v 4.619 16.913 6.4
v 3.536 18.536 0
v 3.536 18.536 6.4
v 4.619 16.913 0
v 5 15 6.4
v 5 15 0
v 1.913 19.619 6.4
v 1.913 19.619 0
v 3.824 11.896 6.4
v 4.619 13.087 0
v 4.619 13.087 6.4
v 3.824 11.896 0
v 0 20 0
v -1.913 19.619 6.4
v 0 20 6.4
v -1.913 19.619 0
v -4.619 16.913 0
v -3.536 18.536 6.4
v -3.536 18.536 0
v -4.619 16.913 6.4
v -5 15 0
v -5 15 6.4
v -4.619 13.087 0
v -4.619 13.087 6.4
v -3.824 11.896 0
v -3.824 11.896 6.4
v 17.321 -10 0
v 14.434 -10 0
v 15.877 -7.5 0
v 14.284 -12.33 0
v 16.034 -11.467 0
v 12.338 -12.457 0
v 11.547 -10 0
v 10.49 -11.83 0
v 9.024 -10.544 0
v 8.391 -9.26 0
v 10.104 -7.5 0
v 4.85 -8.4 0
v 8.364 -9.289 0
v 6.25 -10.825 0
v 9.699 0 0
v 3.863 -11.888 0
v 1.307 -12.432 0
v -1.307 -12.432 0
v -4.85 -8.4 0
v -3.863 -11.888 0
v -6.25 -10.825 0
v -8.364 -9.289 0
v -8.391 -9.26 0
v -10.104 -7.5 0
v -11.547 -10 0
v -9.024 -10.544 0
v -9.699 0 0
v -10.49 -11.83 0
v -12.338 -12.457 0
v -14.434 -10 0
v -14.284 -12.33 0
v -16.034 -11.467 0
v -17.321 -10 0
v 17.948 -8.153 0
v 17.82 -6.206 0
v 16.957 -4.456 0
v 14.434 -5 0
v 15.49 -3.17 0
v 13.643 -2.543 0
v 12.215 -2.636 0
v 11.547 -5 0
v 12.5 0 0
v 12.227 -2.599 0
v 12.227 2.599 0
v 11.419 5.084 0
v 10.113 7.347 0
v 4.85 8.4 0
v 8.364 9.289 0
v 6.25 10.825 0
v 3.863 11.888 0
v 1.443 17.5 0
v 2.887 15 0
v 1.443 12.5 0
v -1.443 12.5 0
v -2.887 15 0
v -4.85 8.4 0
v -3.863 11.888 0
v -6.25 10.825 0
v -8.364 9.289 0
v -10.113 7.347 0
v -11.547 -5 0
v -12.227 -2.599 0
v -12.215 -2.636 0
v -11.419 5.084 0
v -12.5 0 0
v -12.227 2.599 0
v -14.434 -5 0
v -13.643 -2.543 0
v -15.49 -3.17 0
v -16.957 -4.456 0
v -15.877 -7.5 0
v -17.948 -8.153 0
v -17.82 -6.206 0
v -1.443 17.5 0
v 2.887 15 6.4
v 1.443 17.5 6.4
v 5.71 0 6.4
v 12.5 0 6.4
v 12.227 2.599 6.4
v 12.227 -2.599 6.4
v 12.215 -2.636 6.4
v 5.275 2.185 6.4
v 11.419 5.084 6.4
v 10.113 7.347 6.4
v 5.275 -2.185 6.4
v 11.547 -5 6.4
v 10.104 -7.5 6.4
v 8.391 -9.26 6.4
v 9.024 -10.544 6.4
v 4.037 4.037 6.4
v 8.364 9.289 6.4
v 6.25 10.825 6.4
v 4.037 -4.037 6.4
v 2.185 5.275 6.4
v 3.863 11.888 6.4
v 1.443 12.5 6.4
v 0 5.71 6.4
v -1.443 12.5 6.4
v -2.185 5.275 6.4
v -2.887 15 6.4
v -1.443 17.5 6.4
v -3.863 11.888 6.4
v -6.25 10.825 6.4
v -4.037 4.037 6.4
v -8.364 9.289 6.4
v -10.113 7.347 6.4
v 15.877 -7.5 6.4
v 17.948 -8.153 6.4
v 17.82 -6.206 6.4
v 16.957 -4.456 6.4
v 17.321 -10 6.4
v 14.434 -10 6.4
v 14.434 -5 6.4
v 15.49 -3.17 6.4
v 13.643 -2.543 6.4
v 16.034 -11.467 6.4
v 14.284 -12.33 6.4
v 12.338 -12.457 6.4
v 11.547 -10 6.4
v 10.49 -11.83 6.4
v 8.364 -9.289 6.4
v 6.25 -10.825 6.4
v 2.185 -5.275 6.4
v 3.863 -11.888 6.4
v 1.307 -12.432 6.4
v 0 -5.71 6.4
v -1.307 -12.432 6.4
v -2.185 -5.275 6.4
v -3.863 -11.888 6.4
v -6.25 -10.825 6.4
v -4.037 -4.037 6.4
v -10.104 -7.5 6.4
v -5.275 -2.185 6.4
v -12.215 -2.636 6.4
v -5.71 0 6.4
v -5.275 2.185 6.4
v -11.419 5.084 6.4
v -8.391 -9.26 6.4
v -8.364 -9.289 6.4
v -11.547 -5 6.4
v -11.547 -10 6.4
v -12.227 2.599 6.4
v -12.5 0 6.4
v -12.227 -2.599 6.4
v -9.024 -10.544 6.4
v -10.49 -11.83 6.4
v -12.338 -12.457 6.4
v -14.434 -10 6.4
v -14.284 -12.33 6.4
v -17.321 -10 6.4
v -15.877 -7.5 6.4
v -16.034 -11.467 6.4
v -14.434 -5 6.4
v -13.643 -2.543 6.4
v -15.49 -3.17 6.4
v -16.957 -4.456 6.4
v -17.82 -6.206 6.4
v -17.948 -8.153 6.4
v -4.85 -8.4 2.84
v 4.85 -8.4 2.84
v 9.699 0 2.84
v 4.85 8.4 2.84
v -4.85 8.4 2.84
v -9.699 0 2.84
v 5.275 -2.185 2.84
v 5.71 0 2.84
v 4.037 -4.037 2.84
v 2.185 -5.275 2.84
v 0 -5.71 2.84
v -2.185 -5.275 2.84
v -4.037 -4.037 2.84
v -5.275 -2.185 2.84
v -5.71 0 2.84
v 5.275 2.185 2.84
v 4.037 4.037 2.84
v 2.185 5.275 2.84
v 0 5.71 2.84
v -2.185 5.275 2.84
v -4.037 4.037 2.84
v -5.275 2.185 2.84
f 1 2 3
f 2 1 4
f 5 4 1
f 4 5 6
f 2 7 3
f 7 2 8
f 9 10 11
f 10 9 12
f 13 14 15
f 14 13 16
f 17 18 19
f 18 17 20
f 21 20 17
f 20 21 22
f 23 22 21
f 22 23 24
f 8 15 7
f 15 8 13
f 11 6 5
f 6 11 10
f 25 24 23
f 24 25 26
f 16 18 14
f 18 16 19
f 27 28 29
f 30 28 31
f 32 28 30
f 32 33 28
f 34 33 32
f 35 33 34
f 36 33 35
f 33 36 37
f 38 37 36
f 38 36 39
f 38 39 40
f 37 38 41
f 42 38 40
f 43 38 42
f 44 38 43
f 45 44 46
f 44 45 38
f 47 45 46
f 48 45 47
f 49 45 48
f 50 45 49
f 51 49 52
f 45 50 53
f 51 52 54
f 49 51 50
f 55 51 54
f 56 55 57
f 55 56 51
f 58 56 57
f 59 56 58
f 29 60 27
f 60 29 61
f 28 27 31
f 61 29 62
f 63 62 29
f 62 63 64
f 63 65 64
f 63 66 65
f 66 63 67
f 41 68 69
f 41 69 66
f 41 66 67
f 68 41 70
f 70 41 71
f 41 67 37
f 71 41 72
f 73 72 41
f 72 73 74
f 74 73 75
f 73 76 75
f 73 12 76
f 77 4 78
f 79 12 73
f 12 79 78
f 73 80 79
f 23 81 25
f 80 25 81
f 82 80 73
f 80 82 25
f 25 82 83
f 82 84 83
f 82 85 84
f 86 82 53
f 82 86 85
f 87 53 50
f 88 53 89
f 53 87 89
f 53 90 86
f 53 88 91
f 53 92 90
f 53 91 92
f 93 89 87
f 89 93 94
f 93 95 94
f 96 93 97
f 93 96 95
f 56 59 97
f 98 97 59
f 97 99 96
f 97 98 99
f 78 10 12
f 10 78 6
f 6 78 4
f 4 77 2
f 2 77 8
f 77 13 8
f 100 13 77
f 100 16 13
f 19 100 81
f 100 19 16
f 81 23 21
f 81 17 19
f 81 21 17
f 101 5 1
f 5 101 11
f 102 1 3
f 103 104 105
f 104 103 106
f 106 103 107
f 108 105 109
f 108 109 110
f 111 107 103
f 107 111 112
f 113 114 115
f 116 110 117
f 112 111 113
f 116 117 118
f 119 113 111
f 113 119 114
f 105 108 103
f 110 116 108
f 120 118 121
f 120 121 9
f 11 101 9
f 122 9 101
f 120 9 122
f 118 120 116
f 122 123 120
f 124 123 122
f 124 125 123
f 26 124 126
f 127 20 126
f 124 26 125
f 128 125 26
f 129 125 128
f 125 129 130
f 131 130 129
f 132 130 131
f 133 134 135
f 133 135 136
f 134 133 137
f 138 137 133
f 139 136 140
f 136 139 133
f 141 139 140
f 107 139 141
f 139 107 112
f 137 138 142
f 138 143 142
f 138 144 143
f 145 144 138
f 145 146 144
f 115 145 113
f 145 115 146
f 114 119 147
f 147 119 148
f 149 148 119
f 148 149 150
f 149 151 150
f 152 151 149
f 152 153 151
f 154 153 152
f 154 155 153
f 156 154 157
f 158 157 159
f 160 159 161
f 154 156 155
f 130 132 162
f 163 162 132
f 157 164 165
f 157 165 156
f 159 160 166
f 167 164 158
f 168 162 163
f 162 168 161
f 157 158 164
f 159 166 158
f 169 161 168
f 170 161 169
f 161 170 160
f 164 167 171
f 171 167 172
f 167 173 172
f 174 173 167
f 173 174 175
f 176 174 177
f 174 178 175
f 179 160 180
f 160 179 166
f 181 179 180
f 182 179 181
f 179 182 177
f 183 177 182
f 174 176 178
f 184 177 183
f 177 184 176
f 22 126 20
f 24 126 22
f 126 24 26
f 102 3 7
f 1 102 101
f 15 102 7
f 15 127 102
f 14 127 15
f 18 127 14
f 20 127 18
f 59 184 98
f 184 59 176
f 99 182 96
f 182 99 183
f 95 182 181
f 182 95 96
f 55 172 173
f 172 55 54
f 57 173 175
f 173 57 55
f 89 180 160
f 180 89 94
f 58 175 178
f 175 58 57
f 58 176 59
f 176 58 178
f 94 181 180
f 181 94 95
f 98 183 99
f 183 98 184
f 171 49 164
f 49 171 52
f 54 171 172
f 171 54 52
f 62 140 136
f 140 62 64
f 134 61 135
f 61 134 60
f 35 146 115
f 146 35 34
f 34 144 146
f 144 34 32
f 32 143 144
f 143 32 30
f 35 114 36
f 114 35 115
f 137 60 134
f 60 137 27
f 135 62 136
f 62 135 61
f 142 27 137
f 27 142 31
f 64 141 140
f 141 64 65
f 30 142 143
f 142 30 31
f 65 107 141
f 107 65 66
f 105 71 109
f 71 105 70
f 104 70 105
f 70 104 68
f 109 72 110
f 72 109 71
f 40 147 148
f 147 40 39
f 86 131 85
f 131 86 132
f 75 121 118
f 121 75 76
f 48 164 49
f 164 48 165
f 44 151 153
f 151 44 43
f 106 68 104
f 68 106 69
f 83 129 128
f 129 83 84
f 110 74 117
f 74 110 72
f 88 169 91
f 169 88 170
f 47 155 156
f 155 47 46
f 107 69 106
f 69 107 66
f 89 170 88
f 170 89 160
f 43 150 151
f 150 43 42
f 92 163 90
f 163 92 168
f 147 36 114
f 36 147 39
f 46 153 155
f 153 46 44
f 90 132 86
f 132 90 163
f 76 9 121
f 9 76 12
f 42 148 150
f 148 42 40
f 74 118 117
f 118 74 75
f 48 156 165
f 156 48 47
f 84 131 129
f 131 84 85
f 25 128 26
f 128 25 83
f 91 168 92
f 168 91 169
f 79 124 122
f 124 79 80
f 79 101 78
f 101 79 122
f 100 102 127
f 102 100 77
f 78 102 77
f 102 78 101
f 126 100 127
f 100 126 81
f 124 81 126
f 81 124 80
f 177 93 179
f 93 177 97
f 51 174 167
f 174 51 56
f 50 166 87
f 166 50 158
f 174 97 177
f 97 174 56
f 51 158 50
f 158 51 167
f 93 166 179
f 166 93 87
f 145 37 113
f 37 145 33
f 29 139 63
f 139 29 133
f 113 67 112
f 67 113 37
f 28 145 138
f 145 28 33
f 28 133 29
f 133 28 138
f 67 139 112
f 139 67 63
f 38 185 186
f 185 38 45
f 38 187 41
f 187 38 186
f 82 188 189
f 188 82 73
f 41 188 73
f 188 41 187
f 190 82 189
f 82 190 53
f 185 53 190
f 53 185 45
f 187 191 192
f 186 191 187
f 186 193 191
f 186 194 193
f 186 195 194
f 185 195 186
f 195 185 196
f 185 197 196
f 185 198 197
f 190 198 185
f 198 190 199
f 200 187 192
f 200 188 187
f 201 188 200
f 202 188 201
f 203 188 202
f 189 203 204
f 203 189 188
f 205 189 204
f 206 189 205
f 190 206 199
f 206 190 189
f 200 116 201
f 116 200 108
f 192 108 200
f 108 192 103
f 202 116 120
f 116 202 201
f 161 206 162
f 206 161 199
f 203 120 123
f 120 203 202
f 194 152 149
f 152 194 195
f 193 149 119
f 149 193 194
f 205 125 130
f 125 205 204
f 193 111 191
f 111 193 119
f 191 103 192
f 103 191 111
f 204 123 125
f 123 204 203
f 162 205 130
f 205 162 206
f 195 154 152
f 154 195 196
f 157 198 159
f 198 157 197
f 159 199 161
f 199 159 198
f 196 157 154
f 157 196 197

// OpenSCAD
// file: vars.scad
// Variables used throughout design.
// Yes, these could use some commenting.
// (c) 2014, Christopher "ScribbleJ" Jansen

// Printer outside dimensions are actually this + corner_thick*2.
printer_w = 400;
printer_l = 400;
printer_h = 400;

// Used wherever I need something arbitrarily large.
huge=500;

// 608 Bearings
//Added some extra space to the bearing retainer so I don't break them during assembly
bearing_w = 7*1.01;  
bearing_d = 22*1.01;
bearing_r = bearing_d/2;
bearing_hole_d = 8;
bearing_hole_r = bearing_hole_d/2;

// Miscellaneous bolts, M3
misc_bolt_d = 3.2;
misc_bolt_r = misc_bolt_d/2;
misc_nut_r  = misc_bolt_d;
misc_bolt_pitch = 0.5;
misc_bolthead_d = misc_bolt_d*2;
misc_bolthead_r = misc_bolthead_d/2;

//Retainer for using a regular bolt (M8) instead of a proper leadscrew as the Z lift nut.
liftNut_d = 8;
liftNut_od = liftNut_d *2;
liftNut_h = liftNut_d * 0.8;
liftNutRetainer_h = liftNut_h ;

// Bearing retainers
//Added some extra thickness to the bearing retainer so I don't break them during assembly
retainer_shell_thick = 0.6;
retainer_shell_sep   = 0.25;
retainer_lip_thick   = 2;
retainer_inner_width = 1;

// GT2, 2mm belting
belt_w    = 6;
belt_thick= 2;
belt_sep  = retainer_lip_thick*2 + 2;

// Some calculated info about the bearing retainers.
calc_retainer_h  = retainer_lip_thick*2 + belt_w;
calc_retainer_ir = bearing_r + retainer_shell_thick*2 + retainer_shell_sep;
calc_retainer_or = calc_retainer_ir + belt_thick;
calc_retainer_b_off = retainer_lip_thick - (bearing_w-belt_w)/2;

// 20mm Tslot and associated bolt dimensions
tslot_w = 20;
tslot_bolt_d = 5;
tslot_bolt_r = tslot_bolt_d/2;
tslot_bolt_l = 4;
tslot_bolthead_d = 10;
tslot_bolthead_r = tslot_bolthead_d/2;

// This variable is called corner_thick, but it's used pretty much everywhere something needs to be sturdy but thin, not
// just on the corners.
// TODO: Anywhere it's used that's not a corner, I should make a new variable for that thing.
corner_thick = 5;
corner_length = tslot_w*3;

// 8mm Smooth Rod dimensions
rod_d=8;
rod_r=rod_d/2;

// Named because they were originally bronze bushings, now expects to be LM8UU.
bushing_d=15;
bushing_r=bushing_d/2;
bushing_l=10;
bushing_flange_r = bushing_r+3;
bushing_flange_w = 1;
bushing_material_thick = 5;

// X Axis dimensions
x_rod_sep = 50;
x_carriage_l = 50;
x_mount_sep_x = x_carriage_l - misc_bolthead_r*2*2 - misc_bolt_r*2;
x_mount_offset = bushing_r + misc_bolt_r * 2;
belt_above_x = bushing_r+misc_nut_r*2;
belt_clamp_w = 7;
x_rod_past_bearing = 20;

// Y Axis dimensions
belt_above_y = 45;
y_above_x = belt_above_x-belt_above_y;


// The standoffs for the belt idler bearings.
bearing_mount_base = corner_thick;
bearing_mount_extra = 2;
belt_above_bearing_mount = bearing_mount_base + bearing_mount_extra + retainer_lip_thick;
bearing_mount_support_tweak = 30;
y_bearing_offset = bushing_r+bushing_material_thick-calc_retainer_ir;
y_bearing_sep_y = calc_retainer_ir*2+belt_thick;
y_bearing_sep_z = belt_w+belt_sep;
bearing_bolt_r  = 4;
bearing_bolt_pitch = 1.25;
bearing_bolt_holder_thick = 4;

// Gap between Y carriage and T-slot
y_carriage_from_tslot = 2;

// 50mm Y-carriage length fits 2 LM8UU
y_carriage_len = 50;

// NEMA17 Motor Dimensions
motor_w = 42.3;
motor_h = motor_w;
motor_bolt_sep = 31.0;
motor_bolt_r   = 1.5;
// Dimensions of pulleys on X/Y Motors
motor_pulley_d = 10;
motor_pulley_r = motor_pulley_d/2;
motor_pulley_h = 5.3;  // This is the distance the pulley is above the motor body, not the height of the pulley itself.
motor_flange_d = 23;
motor_flange_r = motor_flange_d/2;
// This creates an extra hole in the motor corner for T-slot mounting, because the spaces for the motor mounts may coincide 
// with one of the standard holes.
motor_corner_extra_hole_pos = tslot_bolt_r+3;

// Some useful precalculated values
calc_corner_from_y_rod = x_rod_past_bearing+corner_thick+y_carriage_from_tslot+tslot_w;
calc_corner_above_x = belt_above_x - belt_above_bearing_mount + bearing_mount_base;
calc_motor1_above_x  = belt_above_x - motor_pulley_h;
calc_motor2_above_x  = belt_above_x - motor_pulley_h + belt_w + belt_sep;
calc_motor_from_y_rod = -bushing_r - bushing_material_thick + bearing_bolt_holder_thick + bearing_bolt_r + calc_retainer_or + motor_pulley_r;

// Motor bracket thick is 12 because I'm using M3x16 to mount the motors and the bolts can fit about 4mm into a NEMA17.
motor_bracket_thick = 12;
motor_bracket_wide = (motor_w - motor_flange_d) / 2;
motor_bracket_len  = motor_w;
motor_bolt_offset  = (motor_w - motor_bolt_sep) / 2;

// How far apart the Z smooth rods should be
z_rod_sep = 150;
z_motor_off = motor_h - tslot_w - corner_thick;

// Very important to set this for your lasercut Z, the thickness of the material you are lasering.
laser_mat_thick = 4.75;
// Laser mat margin is how much material is required outside of a tabslot.
laser_mat_margin = laser_mat_thick;
// Distance between heated bed holes, 209 is standard for a reprap heated bed
bed_mount_sep   = 209;
// Bed mounting holes will be created centered on the Z platform, and another set offset at this distance from the smooth rod:
bed_from_z      = 60;
// bed_box_r and bed_box_h here will exactly fir the lm8uu holders.  Decrease at your own peril.
bed_box_r       = 25;
bed_box_h       = 50;
z_ends_sep = printer_l - tslot_w*2 - corner_thick*2 - motor_w;
platform_l      =  laser_mat_margin*2 + laser_mat_thick*2 + bed_box_r*2 + z_ends_sep;
platform_w      = bed_mount_sep + misc_bolt_r*2 + laser_mat_margin*2;
// These settings for the leadscrew fit the leadscrews sold by MakersToolWorks
z_leadscrew_passthrough_r = 12/2;
leadscrew_bolt_offset = 22/2;
leadscrew_bolt_r = 3.2/2;
laser_bushing_fudge = 0.1; // No longer used since the change to lm8uu


// LM8UU bearing dimensions
lm8uu_d=15;
lm8uu_r=lm8uu_d/2;
lm8uu_l=24;
// The nut and bolt here refer to the ones used in the Z axis' four LM8UU holders.
lm8uu_bolt_r=5/2;
lm8uu_nut_r=10/2;

arduino_width=60;
// file: common.scad
// Common functions used in various places throughout.
// (c) 2014, Christopher "ScribbleJ" Jansen
include <vars.scad>

// Reduce radius of holes intended to hold bolts by threads.
// 0.86603 * p = nominal depth of threads.  1/3-1/2 of that is about right.
function smallhole(r,p) = r - ((p*0.86603)/3);

// Polyhole derived from Nophead's Polyhole work: http://hydraraptor.blogspot.com/2011/02/polyholes.html
module polyhole(r,h,v=6,a=0)
{
  rotate([0,0,a]) cylinder( h = h, r = r  / cos( 180 / v ), $fn = v );
}
// 2D version of Polyhole
module polycircle(r,v=6,a=0)
{
  rotate([0,0,a]) circle(r = r  / cos( 180 / v ), $fn = v );
}
// Cutout for bolthole
module bolt(bolt_r = misc_bolt_r,bolthead_r = misc_bolthead_r,bolt_len = huge,v=6,a=0)
{
  translate([0,0,-bolt_len]) polyhole(r=bolt_r,h=bolt_len+1,v=v,a=a);
  polyhole(r=bolthead_r,h=huge,v=v,a=a);
}
// 2D ring
module ring(inner=5,outer=10,v=32)
{
  difference()
  {
    circle(r=outer);
    polycircle(r=inner,v=v);
  }
} 
// 2D Rounded square
module roundsquare(dim=[50,50],r=5)
{
  translate([0,r]) square([dim[0], dim[1] - r*2]);
  translate([r,0]) square([dim[0] - r*2, dim[1]]);
  for(x=[r,dim[0]-r])
  for(y=[r,dim[1]-r])
    translate([x,y]) circle(r=r);
}
// Lasercutting Tabs
module maketabs(l=100,w=5,num=10)
{
  tablength=l/(num * 2);
  for(x=[tablength/2:tablength*2:l])
    translate([x,0]) square([tablength,w]);
}
// Support for printing bearing mount
module support(l=bearing_mount_base+bearing_mount_extra+y_bearing_sep_z+calc_retainer_b_off,w=bearing_hole_d * tan(180/6) *2,extra=0,extra_l=0)
{
  translate([-w/2,0,-l]) 
  {
    difference()
    {
      rotate([45,0,0]) cube([w,huge/2,huge/2]);
      translate([-huge/2,0,0]) cube([huge,huge,huge]);
      translate([-huge/2,-huge/2,l]) cube([huge,huge,huge]);
    }
    translate([0,-extra,-extra_l/2]) cube([w,extra,extra_l]);
  }

}
// main file
// Various parts for Z Assembly.
// Print 4 of lm8uu_retainer(), 4 of z_rod_holder(), 2 of z_motor_mount, 2 of z_end()
// TODO: Should be broken out to separate files eventually.
// (c) 2014, Christopher "ScribbleJ" Jansen
include <common.scad>
use <platform.scad>





//lm8uu_retainer();
//translate([40,0,0]) 
    liftNut_retainer();

module lm8uu_retainer()
{
  difference()
  {
    union()
    {
      cylinder(r=lm8uu_r + corner_thick,h=bed_box_h);
      for(a=[0:120:240])
        rotate([0,0,a]) translate([0,lm8uu_r+corner_thick+lm8uu_bolt_r]) cylinder(r=lm8uu_nut_r,h=bed_box_h);
    }
    translate([0,0,-1])
    {
      polyhole(r=lm8uu_r,h=huge,v=16);
      for(a=[0:120:240])
        rotate([0,0,a]) translate([0,lm8uu_r+corner_thick+lm8uu_bolt_r]) polyhole(r=lm8uu_bolt_r,h=huge);
    }
  }
}

module liftNut_retainer()
{
  difference()
  {
    union()
    {
      cylinder(r=lm8uu_r + corner_thick,h=liftNutRetainer_h);
      for(a=[0:120:240])
        rotate([0,0,a]) translate([0,lm8uu_r+corner_thick+lm8uu_bolt_r]) cylinder(r=lm8uu_nut_r,h=liftNutRetainer_h);
    }
    translate([0,0,-1])
    {
      polyhole(r=liftNut_od/2*1.05,h=liftNut_h*0.6,v=6);
      polyhole(r=liftNut_d/2 * 1.4 ,h=huge,v=16);
      for(a=[0:120:240])
        rotate([0,0,a]) translate([0,lm8uu_r+corner_thick+lm8uu_bolt_r]) polyhole(r=lm8uu_bolt_r,h=huge);
    }
  }
}
